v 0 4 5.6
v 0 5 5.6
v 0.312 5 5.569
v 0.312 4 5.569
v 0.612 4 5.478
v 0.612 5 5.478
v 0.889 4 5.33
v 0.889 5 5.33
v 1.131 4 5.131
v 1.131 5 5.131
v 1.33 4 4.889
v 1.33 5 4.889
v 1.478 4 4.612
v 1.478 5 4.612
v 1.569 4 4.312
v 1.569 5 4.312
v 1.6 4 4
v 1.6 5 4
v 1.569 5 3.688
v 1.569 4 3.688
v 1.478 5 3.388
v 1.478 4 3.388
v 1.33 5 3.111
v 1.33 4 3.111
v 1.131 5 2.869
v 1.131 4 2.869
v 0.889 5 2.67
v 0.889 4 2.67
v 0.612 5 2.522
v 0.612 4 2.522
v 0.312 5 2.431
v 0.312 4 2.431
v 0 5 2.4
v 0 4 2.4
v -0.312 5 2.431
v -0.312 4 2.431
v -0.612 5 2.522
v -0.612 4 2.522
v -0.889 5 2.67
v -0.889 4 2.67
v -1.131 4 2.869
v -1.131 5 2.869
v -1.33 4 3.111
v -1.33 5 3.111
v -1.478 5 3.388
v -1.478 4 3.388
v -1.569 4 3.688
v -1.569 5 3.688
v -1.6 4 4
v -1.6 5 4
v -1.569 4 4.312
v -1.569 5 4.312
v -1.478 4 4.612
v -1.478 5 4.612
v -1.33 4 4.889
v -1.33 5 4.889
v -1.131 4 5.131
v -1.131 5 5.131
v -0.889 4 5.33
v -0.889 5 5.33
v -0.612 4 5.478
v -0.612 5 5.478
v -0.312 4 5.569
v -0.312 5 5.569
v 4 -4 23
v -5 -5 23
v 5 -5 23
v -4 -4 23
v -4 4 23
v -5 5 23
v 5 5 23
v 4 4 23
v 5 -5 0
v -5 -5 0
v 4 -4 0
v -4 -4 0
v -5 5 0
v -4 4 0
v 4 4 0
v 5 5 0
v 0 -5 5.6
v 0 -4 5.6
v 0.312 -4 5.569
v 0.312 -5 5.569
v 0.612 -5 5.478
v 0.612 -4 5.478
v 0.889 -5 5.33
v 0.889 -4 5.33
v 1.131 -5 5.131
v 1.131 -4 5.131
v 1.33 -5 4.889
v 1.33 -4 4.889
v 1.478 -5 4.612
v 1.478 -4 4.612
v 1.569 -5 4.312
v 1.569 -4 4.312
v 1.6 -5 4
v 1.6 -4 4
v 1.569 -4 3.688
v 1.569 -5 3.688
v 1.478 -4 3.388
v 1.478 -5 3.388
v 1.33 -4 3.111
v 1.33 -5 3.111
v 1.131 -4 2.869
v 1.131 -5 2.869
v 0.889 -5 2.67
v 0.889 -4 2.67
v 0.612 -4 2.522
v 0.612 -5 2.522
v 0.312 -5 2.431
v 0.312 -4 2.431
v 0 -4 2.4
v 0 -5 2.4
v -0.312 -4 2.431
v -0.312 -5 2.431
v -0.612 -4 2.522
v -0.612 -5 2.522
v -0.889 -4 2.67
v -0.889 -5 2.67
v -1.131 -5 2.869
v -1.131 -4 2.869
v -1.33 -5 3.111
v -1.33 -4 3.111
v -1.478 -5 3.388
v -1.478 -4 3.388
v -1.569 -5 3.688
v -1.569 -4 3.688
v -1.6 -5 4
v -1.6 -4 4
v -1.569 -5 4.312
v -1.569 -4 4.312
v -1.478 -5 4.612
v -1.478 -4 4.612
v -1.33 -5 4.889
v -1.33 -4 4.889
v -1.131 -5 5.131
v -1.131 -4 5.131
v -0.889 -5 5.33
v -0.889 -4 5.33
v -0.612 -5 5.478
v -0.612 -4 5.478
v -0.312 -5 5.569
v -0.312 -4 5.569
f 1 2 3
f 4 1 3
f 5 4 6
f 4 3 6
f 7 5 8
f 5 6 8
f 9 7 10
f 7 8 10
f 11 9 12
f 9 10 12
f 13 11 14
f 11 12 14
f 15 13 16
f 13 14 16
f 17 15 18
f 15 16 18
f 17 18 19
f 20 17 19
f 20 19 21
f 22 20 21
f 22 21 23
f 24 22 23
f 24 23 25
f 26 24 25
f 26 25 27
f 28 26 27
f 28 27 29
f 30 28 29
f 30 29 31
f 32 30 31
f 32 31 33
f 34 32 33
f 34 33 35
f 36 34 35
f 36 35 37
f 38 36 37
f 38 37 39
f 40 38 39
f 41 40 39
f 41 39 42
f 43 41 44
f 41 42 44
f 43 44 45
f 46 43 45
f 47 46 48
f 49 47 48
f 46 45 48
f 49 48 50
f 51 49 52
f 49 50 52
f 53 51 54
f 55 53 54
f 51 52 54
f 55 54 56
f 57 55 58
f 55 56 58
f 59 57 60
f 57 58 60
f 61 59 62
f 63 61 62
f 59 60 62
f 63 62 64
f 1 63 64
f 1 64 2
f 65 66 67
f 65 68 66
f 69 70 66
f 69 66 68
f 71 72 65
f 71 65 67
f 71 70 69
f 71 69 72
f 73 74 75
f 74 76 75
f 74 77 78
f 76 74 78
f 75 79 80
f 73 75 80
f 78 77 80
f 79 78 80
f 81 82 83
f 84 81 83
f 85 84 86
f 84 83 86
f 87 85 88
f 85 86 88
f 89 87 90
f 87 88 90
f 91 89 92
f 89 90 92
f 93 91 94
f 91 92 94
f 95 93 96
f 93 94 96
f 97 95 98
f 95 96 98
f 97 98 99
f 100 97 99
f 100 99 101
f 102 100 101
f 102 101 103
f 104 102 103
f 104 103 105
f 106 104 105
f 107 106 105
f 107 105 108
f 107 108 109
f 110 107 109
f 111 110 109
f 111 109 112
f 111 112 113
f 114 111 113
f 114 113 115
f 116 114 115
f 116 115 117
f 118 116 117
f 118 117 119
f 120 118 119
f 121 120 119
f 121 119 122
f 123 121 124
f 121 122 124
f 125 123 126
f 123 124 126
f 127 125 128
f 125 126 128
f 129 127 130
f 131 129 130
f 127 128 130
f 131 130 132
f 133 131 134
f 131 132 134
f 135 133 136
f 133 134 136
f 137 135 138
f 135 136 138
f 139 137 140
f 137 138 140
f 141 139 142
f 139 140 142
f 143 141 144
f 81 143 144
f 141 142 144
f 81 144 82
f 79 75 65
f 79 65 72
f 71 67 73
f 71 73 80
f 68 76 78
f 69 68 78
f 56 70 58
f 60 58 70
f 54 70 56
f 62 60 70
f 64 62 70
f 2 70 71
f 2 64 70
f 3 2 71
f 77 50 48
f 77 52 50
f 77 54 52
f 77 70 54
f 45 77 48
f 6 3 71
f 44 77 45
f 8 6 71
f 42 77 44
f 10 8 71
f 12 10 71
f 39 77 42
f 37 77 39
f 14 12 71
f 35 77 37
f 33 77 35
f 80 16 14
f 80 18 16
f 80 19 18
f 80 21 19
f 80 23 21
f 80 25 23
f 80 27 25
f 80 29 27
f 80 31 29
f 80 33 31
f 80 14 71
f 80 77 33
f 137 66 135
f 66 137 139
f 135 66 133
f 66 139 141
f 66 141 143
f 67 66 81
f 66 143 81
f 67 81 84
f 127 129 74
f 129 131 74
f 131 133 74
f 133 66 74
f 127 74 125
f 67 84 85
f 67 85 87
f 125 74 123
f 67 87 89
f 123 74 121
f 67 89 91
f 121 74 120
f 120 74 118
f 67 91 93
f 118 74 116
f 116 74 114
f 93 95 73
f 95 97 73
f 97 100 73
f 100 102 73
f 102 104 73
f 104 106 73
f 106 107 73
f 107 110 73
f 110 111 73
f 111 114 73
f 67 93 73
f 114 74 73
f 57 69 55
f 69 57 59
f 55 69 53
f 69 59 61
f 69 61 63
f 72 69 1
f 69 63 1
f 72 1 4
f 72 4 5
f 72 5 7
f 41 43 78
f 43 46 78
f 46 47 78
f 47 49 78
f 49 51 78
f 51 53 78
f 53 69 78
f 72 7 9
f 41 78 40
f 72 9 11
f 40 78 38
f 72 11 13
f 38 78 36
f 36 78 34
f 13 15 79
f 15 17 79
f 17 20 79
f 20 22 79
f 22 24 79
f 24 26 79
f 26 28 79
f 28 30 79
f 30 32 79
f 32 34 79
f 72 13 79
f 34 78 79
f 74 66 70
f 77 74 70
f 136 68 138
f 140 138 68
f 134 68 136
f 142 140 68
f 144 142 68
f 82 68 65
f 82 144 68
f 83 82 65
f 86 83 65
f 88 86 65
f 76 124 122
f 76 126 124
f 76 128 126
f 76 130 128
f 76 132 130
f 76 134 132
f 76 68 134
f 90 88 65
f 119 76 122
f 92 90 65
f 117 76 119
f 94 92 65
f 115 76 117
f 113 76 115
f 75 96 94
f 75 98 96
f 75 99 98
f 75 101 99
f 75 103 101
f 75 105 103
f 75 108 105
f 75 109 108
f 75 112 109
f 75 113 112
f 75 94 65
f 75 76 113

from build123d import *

# Parameters (mm, degrees)
SKETCH_281_W          = 10
SKETCH_281_H          = 10
SKETCH_281_W_2        = 8
SKETCH_281_H_2        = 8
EXTRUDE_338_DEPTH     = 23
SKETCH_410_R          = 1.6
CUT_EXTRUDE_739_DEPTH = 26.573423705


with BuildPart() as part:
    # Sketch 281 → Extrude 338 (new body)
    with BuildSketch(Plane.XY):
        Rectangle(SKETCH_281_W, SKETCH_281_H)
        Rectangle(SKETCH_281_W_2, SKETCH_281_H_2, mode=Mode.SUBTRACT)
    extrude(amount=EXTRUDE_338_DEPTH)

    # Sketch 410 → Cut-Extrude 739 (cut, through all)
    with BuildSketch(Plane(origin=(0, 5, 0), x_dir=(1, 0, 0), z_dir=(0, 1, 0))):
        with Locations(Location((0, -4, 0), (0, 0, 270))):
            Circle(SKETCH_410_R)
    extrude(amount=-CUT_EXTRUDE_739_DEPTH, mode=Mode.SUBTRACT)


solid = part.part
